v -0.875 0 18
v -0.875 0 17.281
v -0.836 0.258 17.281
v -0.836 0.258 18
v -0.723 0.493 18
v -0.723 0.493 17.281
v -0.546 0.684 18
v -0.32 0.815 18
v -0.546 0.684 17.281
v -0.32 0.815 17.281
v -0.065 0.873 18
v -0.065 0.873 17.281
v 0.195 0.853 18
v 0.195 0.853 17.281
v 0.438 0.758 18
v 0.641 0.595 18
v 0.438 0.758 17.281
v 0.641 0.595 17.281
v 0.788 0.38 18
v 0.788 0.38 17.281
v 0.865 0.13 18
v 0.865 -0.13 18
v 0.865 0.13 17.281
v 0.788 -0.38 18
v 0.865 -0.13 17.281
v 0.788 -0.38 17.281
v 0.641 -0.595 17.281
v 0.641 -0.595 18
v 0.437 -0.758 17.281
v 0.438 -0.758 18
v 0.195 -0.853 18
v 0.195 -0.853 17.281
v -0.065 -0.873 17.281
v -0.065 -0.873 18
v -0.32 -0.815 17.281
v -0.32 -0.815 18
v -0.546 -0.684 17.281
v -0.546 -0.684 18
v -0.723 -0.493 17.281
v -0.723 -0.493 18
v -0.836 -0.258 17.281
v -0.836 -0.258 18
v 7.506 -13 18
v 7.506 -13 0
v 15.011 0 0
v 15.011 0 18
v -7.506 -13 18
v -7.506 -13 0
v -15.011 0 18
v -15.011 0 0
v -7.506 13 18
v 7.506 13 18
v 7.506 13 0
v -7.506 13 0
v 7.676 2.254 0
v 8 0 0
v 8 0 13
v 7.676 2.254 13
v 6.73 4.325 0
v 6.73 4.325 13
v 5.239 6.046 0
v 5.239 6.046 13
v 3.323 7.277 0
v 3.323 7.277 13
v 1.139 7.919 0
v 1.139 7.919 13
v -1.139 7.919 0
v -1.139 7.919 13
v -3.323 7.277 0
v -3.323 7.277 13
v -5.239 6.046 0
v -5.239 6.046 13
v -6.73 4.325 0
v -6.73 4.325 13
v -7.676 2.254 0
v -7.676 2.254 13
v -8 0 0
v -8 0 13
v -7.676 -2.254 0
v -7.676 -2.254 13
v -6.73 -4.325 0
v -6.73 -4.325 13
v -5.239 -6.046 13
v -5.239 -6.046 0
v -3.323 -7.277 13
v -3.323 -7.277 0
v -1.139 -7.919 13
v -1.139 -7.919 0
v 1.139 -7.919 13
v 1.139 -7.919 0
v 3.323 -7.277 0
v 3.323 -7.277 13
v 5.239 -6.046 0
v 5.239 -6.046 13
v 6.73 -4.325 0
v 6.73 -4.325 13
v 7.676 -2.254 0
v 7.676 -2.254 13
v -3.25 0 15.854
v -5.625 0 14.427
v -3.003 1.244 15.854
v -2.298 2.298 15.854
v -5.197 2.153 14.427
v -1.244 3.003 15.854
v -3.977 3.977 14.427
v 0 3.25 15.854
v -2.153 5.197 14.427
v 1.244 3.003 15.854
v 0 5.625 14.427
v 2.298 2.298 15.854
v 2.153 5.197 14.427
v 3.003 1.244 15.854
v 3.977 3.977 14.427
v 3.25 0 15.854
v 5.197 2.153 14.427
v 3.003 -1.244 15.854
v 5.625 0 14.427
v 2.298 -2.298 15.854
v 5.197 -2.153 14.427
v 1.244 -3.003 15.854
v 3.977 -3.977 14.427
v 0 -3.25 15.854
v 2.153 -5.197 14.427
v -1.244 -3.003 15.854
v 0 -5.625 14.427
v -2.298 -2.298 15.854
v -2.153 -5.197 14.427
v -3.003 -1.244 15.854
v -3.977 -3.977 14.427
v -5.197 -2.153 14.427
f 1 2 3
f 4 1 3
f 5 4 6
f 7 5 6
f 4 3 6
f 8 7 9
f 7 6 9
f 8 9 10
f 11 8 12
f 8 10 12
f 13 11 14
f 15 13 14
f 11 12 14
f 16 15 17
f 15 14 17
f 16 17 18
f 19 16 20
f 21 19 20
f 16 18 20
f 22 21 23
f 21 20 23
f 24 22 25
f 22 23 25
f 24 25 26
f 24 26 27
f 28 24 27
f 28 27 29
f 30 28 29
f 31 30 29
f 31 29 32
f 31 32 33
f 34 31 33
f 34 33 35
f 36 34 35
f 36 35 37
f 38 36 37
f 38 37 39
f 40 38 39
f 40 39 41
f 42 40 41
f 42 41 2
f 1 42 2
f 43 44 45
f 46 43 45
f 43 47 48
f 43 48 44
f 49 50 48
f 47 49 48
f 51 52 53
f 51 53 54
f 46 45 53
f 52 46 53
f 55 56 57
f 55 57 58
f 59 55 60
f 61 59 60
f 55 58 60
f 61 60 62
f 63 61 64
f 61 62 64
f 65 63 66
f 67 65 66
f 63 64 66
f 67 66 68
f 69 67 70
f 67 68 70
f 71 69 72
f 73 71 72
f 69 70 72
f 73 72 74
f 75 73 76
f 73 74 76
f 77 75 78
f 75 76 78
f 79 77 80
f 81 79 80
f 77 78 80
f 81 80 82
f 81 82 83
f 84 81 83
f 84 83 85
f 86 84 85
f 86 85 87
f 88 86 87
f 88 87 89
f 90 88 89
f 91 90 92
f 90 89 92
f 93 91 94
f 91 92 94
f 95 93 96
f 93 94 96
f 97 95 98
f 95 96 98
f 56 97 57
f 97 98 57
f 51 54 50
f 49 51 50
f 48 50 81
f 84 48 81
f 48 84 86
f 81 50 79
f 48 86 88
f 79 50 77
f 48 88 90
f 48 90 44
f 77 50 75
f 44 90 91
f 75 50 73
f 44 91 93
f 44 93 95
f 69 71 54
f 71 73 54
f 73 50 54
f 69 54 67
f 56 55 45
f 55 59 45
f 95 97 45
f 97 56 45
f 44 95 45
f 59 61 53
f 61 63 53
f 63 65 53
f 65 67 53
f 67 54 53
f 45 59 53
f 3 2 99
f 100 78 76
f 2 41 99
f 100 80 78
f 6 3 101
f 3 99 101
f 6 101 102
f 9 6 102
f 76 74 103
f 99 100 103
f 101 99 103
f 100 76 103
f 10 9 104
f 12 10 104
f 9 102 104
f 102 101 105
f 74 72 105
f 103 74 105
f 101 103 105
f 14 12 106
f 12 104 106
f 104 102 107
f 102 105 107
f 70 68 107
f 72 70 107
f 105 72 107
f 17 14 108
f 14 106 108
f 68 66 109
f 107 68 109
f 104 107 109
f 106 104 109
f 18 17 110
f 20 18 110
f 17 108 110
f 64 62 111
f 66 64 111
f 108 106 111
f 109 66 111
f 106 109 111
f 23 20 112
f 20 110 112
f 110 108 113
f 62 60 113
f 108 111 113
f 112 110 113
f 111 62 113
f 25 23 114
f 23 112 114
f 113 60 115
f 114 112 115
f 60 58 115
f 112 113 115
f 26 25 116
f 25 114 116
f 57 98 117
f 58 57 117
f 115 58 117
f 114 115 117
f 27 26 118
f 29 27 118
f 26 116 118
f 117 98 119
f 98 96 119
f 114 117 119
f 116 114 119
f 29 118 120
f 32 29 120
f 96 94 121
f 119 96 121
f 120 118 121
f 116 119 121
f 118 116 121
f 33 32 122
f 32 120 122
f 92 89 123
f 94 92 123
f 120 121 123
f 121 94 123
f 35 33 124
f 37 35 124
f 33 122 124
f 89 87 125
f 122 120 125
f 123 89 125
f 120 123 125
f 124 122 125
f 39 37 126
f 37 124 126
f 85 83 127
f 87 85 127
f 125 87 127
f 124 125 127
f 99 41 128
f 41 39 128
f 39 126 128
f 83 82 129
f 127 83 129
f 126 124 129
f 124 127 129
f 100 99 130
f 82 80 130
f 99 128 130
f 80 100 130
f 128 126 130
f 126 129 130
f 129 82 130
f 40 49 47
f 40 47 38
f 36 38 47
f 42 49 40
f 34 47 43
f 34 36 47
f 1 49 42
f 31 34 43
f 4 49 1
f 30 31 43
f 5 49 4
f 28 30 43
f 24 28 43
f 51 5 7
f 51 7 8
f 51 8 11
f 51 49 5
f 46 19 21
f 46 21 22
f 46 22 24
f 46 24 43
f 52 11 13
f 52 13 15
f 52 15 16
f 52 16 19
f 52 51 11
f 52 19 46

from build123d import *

# Parameters (mm, degrees)
AUFSATZ_LINEAR_AUSTRAGEN1_DEPTH      = 18
F_16_0_16_DURCHMESSER_BOHRUNG1_D     = 16
F_16_0_16_DURCHMESSER_BOHRUNG1_DEPTH = 13
F_16_0_16_DURCHMESSER_BOHRUNG1_TIP   = 4.806884952
F_1_75_1_75_DURCHMESSER_BOHRUNG1_D   = 1.75


with BuildPart() as part:
    # Skizze1 → Aufsatz-Linear austragen1 (new body)
    with BuildSketch(Plane.XY):
        Polygon((15.011106999, 0), (7.505553499, 13), (-7.505553499, 13), (-15.011106999, 0), (-7.505553499, -13), (7.505553499, -13), align=None)
    extrude(amount=AUFSATZ_LINEAR_AUSTRAGEN1_DEPTH)

    # Ø16.0 (16) Durchmesser Bohrung1
    with Locations(Plane(origin=(0, 0, 0), x_dir=(-1, 0, 0), z_dir=(0, 0, -1))):
        with Locations((0, 0)):
            Hole(F_16_0_16_DURCHMESSER_BOHRUNG1_D / 2, depth=F_16_0_16_DURCHMESSER_BOHRUNG1_DEPTH)
            with Locations((0, 0, -(F_16_0_16_DURCHMESSER_BOHRUNG1_DEPTH + F_16_0_16_DURCHMESSER_BOHRUNG1_TIP / 2))):  # 118° drill point
                Cone(0, F_16_0_16_DURCHMESSER_BOHRUNG1_D / 2, F_16_0_16_DURCHMESSER_BOHRUNG1_TIP, mode=Mode.SUBTRACT)

    # Ø1.75 (1.75) Durchmesser Bohrung1 (through all)
    with Locations(Plane.XY.offset(18)):
        with Locations((0, 0)):
            Hole(F_1_75_1_75_DURCHMESSER_BOHRUNG1_D / 2)


solid = part.part
